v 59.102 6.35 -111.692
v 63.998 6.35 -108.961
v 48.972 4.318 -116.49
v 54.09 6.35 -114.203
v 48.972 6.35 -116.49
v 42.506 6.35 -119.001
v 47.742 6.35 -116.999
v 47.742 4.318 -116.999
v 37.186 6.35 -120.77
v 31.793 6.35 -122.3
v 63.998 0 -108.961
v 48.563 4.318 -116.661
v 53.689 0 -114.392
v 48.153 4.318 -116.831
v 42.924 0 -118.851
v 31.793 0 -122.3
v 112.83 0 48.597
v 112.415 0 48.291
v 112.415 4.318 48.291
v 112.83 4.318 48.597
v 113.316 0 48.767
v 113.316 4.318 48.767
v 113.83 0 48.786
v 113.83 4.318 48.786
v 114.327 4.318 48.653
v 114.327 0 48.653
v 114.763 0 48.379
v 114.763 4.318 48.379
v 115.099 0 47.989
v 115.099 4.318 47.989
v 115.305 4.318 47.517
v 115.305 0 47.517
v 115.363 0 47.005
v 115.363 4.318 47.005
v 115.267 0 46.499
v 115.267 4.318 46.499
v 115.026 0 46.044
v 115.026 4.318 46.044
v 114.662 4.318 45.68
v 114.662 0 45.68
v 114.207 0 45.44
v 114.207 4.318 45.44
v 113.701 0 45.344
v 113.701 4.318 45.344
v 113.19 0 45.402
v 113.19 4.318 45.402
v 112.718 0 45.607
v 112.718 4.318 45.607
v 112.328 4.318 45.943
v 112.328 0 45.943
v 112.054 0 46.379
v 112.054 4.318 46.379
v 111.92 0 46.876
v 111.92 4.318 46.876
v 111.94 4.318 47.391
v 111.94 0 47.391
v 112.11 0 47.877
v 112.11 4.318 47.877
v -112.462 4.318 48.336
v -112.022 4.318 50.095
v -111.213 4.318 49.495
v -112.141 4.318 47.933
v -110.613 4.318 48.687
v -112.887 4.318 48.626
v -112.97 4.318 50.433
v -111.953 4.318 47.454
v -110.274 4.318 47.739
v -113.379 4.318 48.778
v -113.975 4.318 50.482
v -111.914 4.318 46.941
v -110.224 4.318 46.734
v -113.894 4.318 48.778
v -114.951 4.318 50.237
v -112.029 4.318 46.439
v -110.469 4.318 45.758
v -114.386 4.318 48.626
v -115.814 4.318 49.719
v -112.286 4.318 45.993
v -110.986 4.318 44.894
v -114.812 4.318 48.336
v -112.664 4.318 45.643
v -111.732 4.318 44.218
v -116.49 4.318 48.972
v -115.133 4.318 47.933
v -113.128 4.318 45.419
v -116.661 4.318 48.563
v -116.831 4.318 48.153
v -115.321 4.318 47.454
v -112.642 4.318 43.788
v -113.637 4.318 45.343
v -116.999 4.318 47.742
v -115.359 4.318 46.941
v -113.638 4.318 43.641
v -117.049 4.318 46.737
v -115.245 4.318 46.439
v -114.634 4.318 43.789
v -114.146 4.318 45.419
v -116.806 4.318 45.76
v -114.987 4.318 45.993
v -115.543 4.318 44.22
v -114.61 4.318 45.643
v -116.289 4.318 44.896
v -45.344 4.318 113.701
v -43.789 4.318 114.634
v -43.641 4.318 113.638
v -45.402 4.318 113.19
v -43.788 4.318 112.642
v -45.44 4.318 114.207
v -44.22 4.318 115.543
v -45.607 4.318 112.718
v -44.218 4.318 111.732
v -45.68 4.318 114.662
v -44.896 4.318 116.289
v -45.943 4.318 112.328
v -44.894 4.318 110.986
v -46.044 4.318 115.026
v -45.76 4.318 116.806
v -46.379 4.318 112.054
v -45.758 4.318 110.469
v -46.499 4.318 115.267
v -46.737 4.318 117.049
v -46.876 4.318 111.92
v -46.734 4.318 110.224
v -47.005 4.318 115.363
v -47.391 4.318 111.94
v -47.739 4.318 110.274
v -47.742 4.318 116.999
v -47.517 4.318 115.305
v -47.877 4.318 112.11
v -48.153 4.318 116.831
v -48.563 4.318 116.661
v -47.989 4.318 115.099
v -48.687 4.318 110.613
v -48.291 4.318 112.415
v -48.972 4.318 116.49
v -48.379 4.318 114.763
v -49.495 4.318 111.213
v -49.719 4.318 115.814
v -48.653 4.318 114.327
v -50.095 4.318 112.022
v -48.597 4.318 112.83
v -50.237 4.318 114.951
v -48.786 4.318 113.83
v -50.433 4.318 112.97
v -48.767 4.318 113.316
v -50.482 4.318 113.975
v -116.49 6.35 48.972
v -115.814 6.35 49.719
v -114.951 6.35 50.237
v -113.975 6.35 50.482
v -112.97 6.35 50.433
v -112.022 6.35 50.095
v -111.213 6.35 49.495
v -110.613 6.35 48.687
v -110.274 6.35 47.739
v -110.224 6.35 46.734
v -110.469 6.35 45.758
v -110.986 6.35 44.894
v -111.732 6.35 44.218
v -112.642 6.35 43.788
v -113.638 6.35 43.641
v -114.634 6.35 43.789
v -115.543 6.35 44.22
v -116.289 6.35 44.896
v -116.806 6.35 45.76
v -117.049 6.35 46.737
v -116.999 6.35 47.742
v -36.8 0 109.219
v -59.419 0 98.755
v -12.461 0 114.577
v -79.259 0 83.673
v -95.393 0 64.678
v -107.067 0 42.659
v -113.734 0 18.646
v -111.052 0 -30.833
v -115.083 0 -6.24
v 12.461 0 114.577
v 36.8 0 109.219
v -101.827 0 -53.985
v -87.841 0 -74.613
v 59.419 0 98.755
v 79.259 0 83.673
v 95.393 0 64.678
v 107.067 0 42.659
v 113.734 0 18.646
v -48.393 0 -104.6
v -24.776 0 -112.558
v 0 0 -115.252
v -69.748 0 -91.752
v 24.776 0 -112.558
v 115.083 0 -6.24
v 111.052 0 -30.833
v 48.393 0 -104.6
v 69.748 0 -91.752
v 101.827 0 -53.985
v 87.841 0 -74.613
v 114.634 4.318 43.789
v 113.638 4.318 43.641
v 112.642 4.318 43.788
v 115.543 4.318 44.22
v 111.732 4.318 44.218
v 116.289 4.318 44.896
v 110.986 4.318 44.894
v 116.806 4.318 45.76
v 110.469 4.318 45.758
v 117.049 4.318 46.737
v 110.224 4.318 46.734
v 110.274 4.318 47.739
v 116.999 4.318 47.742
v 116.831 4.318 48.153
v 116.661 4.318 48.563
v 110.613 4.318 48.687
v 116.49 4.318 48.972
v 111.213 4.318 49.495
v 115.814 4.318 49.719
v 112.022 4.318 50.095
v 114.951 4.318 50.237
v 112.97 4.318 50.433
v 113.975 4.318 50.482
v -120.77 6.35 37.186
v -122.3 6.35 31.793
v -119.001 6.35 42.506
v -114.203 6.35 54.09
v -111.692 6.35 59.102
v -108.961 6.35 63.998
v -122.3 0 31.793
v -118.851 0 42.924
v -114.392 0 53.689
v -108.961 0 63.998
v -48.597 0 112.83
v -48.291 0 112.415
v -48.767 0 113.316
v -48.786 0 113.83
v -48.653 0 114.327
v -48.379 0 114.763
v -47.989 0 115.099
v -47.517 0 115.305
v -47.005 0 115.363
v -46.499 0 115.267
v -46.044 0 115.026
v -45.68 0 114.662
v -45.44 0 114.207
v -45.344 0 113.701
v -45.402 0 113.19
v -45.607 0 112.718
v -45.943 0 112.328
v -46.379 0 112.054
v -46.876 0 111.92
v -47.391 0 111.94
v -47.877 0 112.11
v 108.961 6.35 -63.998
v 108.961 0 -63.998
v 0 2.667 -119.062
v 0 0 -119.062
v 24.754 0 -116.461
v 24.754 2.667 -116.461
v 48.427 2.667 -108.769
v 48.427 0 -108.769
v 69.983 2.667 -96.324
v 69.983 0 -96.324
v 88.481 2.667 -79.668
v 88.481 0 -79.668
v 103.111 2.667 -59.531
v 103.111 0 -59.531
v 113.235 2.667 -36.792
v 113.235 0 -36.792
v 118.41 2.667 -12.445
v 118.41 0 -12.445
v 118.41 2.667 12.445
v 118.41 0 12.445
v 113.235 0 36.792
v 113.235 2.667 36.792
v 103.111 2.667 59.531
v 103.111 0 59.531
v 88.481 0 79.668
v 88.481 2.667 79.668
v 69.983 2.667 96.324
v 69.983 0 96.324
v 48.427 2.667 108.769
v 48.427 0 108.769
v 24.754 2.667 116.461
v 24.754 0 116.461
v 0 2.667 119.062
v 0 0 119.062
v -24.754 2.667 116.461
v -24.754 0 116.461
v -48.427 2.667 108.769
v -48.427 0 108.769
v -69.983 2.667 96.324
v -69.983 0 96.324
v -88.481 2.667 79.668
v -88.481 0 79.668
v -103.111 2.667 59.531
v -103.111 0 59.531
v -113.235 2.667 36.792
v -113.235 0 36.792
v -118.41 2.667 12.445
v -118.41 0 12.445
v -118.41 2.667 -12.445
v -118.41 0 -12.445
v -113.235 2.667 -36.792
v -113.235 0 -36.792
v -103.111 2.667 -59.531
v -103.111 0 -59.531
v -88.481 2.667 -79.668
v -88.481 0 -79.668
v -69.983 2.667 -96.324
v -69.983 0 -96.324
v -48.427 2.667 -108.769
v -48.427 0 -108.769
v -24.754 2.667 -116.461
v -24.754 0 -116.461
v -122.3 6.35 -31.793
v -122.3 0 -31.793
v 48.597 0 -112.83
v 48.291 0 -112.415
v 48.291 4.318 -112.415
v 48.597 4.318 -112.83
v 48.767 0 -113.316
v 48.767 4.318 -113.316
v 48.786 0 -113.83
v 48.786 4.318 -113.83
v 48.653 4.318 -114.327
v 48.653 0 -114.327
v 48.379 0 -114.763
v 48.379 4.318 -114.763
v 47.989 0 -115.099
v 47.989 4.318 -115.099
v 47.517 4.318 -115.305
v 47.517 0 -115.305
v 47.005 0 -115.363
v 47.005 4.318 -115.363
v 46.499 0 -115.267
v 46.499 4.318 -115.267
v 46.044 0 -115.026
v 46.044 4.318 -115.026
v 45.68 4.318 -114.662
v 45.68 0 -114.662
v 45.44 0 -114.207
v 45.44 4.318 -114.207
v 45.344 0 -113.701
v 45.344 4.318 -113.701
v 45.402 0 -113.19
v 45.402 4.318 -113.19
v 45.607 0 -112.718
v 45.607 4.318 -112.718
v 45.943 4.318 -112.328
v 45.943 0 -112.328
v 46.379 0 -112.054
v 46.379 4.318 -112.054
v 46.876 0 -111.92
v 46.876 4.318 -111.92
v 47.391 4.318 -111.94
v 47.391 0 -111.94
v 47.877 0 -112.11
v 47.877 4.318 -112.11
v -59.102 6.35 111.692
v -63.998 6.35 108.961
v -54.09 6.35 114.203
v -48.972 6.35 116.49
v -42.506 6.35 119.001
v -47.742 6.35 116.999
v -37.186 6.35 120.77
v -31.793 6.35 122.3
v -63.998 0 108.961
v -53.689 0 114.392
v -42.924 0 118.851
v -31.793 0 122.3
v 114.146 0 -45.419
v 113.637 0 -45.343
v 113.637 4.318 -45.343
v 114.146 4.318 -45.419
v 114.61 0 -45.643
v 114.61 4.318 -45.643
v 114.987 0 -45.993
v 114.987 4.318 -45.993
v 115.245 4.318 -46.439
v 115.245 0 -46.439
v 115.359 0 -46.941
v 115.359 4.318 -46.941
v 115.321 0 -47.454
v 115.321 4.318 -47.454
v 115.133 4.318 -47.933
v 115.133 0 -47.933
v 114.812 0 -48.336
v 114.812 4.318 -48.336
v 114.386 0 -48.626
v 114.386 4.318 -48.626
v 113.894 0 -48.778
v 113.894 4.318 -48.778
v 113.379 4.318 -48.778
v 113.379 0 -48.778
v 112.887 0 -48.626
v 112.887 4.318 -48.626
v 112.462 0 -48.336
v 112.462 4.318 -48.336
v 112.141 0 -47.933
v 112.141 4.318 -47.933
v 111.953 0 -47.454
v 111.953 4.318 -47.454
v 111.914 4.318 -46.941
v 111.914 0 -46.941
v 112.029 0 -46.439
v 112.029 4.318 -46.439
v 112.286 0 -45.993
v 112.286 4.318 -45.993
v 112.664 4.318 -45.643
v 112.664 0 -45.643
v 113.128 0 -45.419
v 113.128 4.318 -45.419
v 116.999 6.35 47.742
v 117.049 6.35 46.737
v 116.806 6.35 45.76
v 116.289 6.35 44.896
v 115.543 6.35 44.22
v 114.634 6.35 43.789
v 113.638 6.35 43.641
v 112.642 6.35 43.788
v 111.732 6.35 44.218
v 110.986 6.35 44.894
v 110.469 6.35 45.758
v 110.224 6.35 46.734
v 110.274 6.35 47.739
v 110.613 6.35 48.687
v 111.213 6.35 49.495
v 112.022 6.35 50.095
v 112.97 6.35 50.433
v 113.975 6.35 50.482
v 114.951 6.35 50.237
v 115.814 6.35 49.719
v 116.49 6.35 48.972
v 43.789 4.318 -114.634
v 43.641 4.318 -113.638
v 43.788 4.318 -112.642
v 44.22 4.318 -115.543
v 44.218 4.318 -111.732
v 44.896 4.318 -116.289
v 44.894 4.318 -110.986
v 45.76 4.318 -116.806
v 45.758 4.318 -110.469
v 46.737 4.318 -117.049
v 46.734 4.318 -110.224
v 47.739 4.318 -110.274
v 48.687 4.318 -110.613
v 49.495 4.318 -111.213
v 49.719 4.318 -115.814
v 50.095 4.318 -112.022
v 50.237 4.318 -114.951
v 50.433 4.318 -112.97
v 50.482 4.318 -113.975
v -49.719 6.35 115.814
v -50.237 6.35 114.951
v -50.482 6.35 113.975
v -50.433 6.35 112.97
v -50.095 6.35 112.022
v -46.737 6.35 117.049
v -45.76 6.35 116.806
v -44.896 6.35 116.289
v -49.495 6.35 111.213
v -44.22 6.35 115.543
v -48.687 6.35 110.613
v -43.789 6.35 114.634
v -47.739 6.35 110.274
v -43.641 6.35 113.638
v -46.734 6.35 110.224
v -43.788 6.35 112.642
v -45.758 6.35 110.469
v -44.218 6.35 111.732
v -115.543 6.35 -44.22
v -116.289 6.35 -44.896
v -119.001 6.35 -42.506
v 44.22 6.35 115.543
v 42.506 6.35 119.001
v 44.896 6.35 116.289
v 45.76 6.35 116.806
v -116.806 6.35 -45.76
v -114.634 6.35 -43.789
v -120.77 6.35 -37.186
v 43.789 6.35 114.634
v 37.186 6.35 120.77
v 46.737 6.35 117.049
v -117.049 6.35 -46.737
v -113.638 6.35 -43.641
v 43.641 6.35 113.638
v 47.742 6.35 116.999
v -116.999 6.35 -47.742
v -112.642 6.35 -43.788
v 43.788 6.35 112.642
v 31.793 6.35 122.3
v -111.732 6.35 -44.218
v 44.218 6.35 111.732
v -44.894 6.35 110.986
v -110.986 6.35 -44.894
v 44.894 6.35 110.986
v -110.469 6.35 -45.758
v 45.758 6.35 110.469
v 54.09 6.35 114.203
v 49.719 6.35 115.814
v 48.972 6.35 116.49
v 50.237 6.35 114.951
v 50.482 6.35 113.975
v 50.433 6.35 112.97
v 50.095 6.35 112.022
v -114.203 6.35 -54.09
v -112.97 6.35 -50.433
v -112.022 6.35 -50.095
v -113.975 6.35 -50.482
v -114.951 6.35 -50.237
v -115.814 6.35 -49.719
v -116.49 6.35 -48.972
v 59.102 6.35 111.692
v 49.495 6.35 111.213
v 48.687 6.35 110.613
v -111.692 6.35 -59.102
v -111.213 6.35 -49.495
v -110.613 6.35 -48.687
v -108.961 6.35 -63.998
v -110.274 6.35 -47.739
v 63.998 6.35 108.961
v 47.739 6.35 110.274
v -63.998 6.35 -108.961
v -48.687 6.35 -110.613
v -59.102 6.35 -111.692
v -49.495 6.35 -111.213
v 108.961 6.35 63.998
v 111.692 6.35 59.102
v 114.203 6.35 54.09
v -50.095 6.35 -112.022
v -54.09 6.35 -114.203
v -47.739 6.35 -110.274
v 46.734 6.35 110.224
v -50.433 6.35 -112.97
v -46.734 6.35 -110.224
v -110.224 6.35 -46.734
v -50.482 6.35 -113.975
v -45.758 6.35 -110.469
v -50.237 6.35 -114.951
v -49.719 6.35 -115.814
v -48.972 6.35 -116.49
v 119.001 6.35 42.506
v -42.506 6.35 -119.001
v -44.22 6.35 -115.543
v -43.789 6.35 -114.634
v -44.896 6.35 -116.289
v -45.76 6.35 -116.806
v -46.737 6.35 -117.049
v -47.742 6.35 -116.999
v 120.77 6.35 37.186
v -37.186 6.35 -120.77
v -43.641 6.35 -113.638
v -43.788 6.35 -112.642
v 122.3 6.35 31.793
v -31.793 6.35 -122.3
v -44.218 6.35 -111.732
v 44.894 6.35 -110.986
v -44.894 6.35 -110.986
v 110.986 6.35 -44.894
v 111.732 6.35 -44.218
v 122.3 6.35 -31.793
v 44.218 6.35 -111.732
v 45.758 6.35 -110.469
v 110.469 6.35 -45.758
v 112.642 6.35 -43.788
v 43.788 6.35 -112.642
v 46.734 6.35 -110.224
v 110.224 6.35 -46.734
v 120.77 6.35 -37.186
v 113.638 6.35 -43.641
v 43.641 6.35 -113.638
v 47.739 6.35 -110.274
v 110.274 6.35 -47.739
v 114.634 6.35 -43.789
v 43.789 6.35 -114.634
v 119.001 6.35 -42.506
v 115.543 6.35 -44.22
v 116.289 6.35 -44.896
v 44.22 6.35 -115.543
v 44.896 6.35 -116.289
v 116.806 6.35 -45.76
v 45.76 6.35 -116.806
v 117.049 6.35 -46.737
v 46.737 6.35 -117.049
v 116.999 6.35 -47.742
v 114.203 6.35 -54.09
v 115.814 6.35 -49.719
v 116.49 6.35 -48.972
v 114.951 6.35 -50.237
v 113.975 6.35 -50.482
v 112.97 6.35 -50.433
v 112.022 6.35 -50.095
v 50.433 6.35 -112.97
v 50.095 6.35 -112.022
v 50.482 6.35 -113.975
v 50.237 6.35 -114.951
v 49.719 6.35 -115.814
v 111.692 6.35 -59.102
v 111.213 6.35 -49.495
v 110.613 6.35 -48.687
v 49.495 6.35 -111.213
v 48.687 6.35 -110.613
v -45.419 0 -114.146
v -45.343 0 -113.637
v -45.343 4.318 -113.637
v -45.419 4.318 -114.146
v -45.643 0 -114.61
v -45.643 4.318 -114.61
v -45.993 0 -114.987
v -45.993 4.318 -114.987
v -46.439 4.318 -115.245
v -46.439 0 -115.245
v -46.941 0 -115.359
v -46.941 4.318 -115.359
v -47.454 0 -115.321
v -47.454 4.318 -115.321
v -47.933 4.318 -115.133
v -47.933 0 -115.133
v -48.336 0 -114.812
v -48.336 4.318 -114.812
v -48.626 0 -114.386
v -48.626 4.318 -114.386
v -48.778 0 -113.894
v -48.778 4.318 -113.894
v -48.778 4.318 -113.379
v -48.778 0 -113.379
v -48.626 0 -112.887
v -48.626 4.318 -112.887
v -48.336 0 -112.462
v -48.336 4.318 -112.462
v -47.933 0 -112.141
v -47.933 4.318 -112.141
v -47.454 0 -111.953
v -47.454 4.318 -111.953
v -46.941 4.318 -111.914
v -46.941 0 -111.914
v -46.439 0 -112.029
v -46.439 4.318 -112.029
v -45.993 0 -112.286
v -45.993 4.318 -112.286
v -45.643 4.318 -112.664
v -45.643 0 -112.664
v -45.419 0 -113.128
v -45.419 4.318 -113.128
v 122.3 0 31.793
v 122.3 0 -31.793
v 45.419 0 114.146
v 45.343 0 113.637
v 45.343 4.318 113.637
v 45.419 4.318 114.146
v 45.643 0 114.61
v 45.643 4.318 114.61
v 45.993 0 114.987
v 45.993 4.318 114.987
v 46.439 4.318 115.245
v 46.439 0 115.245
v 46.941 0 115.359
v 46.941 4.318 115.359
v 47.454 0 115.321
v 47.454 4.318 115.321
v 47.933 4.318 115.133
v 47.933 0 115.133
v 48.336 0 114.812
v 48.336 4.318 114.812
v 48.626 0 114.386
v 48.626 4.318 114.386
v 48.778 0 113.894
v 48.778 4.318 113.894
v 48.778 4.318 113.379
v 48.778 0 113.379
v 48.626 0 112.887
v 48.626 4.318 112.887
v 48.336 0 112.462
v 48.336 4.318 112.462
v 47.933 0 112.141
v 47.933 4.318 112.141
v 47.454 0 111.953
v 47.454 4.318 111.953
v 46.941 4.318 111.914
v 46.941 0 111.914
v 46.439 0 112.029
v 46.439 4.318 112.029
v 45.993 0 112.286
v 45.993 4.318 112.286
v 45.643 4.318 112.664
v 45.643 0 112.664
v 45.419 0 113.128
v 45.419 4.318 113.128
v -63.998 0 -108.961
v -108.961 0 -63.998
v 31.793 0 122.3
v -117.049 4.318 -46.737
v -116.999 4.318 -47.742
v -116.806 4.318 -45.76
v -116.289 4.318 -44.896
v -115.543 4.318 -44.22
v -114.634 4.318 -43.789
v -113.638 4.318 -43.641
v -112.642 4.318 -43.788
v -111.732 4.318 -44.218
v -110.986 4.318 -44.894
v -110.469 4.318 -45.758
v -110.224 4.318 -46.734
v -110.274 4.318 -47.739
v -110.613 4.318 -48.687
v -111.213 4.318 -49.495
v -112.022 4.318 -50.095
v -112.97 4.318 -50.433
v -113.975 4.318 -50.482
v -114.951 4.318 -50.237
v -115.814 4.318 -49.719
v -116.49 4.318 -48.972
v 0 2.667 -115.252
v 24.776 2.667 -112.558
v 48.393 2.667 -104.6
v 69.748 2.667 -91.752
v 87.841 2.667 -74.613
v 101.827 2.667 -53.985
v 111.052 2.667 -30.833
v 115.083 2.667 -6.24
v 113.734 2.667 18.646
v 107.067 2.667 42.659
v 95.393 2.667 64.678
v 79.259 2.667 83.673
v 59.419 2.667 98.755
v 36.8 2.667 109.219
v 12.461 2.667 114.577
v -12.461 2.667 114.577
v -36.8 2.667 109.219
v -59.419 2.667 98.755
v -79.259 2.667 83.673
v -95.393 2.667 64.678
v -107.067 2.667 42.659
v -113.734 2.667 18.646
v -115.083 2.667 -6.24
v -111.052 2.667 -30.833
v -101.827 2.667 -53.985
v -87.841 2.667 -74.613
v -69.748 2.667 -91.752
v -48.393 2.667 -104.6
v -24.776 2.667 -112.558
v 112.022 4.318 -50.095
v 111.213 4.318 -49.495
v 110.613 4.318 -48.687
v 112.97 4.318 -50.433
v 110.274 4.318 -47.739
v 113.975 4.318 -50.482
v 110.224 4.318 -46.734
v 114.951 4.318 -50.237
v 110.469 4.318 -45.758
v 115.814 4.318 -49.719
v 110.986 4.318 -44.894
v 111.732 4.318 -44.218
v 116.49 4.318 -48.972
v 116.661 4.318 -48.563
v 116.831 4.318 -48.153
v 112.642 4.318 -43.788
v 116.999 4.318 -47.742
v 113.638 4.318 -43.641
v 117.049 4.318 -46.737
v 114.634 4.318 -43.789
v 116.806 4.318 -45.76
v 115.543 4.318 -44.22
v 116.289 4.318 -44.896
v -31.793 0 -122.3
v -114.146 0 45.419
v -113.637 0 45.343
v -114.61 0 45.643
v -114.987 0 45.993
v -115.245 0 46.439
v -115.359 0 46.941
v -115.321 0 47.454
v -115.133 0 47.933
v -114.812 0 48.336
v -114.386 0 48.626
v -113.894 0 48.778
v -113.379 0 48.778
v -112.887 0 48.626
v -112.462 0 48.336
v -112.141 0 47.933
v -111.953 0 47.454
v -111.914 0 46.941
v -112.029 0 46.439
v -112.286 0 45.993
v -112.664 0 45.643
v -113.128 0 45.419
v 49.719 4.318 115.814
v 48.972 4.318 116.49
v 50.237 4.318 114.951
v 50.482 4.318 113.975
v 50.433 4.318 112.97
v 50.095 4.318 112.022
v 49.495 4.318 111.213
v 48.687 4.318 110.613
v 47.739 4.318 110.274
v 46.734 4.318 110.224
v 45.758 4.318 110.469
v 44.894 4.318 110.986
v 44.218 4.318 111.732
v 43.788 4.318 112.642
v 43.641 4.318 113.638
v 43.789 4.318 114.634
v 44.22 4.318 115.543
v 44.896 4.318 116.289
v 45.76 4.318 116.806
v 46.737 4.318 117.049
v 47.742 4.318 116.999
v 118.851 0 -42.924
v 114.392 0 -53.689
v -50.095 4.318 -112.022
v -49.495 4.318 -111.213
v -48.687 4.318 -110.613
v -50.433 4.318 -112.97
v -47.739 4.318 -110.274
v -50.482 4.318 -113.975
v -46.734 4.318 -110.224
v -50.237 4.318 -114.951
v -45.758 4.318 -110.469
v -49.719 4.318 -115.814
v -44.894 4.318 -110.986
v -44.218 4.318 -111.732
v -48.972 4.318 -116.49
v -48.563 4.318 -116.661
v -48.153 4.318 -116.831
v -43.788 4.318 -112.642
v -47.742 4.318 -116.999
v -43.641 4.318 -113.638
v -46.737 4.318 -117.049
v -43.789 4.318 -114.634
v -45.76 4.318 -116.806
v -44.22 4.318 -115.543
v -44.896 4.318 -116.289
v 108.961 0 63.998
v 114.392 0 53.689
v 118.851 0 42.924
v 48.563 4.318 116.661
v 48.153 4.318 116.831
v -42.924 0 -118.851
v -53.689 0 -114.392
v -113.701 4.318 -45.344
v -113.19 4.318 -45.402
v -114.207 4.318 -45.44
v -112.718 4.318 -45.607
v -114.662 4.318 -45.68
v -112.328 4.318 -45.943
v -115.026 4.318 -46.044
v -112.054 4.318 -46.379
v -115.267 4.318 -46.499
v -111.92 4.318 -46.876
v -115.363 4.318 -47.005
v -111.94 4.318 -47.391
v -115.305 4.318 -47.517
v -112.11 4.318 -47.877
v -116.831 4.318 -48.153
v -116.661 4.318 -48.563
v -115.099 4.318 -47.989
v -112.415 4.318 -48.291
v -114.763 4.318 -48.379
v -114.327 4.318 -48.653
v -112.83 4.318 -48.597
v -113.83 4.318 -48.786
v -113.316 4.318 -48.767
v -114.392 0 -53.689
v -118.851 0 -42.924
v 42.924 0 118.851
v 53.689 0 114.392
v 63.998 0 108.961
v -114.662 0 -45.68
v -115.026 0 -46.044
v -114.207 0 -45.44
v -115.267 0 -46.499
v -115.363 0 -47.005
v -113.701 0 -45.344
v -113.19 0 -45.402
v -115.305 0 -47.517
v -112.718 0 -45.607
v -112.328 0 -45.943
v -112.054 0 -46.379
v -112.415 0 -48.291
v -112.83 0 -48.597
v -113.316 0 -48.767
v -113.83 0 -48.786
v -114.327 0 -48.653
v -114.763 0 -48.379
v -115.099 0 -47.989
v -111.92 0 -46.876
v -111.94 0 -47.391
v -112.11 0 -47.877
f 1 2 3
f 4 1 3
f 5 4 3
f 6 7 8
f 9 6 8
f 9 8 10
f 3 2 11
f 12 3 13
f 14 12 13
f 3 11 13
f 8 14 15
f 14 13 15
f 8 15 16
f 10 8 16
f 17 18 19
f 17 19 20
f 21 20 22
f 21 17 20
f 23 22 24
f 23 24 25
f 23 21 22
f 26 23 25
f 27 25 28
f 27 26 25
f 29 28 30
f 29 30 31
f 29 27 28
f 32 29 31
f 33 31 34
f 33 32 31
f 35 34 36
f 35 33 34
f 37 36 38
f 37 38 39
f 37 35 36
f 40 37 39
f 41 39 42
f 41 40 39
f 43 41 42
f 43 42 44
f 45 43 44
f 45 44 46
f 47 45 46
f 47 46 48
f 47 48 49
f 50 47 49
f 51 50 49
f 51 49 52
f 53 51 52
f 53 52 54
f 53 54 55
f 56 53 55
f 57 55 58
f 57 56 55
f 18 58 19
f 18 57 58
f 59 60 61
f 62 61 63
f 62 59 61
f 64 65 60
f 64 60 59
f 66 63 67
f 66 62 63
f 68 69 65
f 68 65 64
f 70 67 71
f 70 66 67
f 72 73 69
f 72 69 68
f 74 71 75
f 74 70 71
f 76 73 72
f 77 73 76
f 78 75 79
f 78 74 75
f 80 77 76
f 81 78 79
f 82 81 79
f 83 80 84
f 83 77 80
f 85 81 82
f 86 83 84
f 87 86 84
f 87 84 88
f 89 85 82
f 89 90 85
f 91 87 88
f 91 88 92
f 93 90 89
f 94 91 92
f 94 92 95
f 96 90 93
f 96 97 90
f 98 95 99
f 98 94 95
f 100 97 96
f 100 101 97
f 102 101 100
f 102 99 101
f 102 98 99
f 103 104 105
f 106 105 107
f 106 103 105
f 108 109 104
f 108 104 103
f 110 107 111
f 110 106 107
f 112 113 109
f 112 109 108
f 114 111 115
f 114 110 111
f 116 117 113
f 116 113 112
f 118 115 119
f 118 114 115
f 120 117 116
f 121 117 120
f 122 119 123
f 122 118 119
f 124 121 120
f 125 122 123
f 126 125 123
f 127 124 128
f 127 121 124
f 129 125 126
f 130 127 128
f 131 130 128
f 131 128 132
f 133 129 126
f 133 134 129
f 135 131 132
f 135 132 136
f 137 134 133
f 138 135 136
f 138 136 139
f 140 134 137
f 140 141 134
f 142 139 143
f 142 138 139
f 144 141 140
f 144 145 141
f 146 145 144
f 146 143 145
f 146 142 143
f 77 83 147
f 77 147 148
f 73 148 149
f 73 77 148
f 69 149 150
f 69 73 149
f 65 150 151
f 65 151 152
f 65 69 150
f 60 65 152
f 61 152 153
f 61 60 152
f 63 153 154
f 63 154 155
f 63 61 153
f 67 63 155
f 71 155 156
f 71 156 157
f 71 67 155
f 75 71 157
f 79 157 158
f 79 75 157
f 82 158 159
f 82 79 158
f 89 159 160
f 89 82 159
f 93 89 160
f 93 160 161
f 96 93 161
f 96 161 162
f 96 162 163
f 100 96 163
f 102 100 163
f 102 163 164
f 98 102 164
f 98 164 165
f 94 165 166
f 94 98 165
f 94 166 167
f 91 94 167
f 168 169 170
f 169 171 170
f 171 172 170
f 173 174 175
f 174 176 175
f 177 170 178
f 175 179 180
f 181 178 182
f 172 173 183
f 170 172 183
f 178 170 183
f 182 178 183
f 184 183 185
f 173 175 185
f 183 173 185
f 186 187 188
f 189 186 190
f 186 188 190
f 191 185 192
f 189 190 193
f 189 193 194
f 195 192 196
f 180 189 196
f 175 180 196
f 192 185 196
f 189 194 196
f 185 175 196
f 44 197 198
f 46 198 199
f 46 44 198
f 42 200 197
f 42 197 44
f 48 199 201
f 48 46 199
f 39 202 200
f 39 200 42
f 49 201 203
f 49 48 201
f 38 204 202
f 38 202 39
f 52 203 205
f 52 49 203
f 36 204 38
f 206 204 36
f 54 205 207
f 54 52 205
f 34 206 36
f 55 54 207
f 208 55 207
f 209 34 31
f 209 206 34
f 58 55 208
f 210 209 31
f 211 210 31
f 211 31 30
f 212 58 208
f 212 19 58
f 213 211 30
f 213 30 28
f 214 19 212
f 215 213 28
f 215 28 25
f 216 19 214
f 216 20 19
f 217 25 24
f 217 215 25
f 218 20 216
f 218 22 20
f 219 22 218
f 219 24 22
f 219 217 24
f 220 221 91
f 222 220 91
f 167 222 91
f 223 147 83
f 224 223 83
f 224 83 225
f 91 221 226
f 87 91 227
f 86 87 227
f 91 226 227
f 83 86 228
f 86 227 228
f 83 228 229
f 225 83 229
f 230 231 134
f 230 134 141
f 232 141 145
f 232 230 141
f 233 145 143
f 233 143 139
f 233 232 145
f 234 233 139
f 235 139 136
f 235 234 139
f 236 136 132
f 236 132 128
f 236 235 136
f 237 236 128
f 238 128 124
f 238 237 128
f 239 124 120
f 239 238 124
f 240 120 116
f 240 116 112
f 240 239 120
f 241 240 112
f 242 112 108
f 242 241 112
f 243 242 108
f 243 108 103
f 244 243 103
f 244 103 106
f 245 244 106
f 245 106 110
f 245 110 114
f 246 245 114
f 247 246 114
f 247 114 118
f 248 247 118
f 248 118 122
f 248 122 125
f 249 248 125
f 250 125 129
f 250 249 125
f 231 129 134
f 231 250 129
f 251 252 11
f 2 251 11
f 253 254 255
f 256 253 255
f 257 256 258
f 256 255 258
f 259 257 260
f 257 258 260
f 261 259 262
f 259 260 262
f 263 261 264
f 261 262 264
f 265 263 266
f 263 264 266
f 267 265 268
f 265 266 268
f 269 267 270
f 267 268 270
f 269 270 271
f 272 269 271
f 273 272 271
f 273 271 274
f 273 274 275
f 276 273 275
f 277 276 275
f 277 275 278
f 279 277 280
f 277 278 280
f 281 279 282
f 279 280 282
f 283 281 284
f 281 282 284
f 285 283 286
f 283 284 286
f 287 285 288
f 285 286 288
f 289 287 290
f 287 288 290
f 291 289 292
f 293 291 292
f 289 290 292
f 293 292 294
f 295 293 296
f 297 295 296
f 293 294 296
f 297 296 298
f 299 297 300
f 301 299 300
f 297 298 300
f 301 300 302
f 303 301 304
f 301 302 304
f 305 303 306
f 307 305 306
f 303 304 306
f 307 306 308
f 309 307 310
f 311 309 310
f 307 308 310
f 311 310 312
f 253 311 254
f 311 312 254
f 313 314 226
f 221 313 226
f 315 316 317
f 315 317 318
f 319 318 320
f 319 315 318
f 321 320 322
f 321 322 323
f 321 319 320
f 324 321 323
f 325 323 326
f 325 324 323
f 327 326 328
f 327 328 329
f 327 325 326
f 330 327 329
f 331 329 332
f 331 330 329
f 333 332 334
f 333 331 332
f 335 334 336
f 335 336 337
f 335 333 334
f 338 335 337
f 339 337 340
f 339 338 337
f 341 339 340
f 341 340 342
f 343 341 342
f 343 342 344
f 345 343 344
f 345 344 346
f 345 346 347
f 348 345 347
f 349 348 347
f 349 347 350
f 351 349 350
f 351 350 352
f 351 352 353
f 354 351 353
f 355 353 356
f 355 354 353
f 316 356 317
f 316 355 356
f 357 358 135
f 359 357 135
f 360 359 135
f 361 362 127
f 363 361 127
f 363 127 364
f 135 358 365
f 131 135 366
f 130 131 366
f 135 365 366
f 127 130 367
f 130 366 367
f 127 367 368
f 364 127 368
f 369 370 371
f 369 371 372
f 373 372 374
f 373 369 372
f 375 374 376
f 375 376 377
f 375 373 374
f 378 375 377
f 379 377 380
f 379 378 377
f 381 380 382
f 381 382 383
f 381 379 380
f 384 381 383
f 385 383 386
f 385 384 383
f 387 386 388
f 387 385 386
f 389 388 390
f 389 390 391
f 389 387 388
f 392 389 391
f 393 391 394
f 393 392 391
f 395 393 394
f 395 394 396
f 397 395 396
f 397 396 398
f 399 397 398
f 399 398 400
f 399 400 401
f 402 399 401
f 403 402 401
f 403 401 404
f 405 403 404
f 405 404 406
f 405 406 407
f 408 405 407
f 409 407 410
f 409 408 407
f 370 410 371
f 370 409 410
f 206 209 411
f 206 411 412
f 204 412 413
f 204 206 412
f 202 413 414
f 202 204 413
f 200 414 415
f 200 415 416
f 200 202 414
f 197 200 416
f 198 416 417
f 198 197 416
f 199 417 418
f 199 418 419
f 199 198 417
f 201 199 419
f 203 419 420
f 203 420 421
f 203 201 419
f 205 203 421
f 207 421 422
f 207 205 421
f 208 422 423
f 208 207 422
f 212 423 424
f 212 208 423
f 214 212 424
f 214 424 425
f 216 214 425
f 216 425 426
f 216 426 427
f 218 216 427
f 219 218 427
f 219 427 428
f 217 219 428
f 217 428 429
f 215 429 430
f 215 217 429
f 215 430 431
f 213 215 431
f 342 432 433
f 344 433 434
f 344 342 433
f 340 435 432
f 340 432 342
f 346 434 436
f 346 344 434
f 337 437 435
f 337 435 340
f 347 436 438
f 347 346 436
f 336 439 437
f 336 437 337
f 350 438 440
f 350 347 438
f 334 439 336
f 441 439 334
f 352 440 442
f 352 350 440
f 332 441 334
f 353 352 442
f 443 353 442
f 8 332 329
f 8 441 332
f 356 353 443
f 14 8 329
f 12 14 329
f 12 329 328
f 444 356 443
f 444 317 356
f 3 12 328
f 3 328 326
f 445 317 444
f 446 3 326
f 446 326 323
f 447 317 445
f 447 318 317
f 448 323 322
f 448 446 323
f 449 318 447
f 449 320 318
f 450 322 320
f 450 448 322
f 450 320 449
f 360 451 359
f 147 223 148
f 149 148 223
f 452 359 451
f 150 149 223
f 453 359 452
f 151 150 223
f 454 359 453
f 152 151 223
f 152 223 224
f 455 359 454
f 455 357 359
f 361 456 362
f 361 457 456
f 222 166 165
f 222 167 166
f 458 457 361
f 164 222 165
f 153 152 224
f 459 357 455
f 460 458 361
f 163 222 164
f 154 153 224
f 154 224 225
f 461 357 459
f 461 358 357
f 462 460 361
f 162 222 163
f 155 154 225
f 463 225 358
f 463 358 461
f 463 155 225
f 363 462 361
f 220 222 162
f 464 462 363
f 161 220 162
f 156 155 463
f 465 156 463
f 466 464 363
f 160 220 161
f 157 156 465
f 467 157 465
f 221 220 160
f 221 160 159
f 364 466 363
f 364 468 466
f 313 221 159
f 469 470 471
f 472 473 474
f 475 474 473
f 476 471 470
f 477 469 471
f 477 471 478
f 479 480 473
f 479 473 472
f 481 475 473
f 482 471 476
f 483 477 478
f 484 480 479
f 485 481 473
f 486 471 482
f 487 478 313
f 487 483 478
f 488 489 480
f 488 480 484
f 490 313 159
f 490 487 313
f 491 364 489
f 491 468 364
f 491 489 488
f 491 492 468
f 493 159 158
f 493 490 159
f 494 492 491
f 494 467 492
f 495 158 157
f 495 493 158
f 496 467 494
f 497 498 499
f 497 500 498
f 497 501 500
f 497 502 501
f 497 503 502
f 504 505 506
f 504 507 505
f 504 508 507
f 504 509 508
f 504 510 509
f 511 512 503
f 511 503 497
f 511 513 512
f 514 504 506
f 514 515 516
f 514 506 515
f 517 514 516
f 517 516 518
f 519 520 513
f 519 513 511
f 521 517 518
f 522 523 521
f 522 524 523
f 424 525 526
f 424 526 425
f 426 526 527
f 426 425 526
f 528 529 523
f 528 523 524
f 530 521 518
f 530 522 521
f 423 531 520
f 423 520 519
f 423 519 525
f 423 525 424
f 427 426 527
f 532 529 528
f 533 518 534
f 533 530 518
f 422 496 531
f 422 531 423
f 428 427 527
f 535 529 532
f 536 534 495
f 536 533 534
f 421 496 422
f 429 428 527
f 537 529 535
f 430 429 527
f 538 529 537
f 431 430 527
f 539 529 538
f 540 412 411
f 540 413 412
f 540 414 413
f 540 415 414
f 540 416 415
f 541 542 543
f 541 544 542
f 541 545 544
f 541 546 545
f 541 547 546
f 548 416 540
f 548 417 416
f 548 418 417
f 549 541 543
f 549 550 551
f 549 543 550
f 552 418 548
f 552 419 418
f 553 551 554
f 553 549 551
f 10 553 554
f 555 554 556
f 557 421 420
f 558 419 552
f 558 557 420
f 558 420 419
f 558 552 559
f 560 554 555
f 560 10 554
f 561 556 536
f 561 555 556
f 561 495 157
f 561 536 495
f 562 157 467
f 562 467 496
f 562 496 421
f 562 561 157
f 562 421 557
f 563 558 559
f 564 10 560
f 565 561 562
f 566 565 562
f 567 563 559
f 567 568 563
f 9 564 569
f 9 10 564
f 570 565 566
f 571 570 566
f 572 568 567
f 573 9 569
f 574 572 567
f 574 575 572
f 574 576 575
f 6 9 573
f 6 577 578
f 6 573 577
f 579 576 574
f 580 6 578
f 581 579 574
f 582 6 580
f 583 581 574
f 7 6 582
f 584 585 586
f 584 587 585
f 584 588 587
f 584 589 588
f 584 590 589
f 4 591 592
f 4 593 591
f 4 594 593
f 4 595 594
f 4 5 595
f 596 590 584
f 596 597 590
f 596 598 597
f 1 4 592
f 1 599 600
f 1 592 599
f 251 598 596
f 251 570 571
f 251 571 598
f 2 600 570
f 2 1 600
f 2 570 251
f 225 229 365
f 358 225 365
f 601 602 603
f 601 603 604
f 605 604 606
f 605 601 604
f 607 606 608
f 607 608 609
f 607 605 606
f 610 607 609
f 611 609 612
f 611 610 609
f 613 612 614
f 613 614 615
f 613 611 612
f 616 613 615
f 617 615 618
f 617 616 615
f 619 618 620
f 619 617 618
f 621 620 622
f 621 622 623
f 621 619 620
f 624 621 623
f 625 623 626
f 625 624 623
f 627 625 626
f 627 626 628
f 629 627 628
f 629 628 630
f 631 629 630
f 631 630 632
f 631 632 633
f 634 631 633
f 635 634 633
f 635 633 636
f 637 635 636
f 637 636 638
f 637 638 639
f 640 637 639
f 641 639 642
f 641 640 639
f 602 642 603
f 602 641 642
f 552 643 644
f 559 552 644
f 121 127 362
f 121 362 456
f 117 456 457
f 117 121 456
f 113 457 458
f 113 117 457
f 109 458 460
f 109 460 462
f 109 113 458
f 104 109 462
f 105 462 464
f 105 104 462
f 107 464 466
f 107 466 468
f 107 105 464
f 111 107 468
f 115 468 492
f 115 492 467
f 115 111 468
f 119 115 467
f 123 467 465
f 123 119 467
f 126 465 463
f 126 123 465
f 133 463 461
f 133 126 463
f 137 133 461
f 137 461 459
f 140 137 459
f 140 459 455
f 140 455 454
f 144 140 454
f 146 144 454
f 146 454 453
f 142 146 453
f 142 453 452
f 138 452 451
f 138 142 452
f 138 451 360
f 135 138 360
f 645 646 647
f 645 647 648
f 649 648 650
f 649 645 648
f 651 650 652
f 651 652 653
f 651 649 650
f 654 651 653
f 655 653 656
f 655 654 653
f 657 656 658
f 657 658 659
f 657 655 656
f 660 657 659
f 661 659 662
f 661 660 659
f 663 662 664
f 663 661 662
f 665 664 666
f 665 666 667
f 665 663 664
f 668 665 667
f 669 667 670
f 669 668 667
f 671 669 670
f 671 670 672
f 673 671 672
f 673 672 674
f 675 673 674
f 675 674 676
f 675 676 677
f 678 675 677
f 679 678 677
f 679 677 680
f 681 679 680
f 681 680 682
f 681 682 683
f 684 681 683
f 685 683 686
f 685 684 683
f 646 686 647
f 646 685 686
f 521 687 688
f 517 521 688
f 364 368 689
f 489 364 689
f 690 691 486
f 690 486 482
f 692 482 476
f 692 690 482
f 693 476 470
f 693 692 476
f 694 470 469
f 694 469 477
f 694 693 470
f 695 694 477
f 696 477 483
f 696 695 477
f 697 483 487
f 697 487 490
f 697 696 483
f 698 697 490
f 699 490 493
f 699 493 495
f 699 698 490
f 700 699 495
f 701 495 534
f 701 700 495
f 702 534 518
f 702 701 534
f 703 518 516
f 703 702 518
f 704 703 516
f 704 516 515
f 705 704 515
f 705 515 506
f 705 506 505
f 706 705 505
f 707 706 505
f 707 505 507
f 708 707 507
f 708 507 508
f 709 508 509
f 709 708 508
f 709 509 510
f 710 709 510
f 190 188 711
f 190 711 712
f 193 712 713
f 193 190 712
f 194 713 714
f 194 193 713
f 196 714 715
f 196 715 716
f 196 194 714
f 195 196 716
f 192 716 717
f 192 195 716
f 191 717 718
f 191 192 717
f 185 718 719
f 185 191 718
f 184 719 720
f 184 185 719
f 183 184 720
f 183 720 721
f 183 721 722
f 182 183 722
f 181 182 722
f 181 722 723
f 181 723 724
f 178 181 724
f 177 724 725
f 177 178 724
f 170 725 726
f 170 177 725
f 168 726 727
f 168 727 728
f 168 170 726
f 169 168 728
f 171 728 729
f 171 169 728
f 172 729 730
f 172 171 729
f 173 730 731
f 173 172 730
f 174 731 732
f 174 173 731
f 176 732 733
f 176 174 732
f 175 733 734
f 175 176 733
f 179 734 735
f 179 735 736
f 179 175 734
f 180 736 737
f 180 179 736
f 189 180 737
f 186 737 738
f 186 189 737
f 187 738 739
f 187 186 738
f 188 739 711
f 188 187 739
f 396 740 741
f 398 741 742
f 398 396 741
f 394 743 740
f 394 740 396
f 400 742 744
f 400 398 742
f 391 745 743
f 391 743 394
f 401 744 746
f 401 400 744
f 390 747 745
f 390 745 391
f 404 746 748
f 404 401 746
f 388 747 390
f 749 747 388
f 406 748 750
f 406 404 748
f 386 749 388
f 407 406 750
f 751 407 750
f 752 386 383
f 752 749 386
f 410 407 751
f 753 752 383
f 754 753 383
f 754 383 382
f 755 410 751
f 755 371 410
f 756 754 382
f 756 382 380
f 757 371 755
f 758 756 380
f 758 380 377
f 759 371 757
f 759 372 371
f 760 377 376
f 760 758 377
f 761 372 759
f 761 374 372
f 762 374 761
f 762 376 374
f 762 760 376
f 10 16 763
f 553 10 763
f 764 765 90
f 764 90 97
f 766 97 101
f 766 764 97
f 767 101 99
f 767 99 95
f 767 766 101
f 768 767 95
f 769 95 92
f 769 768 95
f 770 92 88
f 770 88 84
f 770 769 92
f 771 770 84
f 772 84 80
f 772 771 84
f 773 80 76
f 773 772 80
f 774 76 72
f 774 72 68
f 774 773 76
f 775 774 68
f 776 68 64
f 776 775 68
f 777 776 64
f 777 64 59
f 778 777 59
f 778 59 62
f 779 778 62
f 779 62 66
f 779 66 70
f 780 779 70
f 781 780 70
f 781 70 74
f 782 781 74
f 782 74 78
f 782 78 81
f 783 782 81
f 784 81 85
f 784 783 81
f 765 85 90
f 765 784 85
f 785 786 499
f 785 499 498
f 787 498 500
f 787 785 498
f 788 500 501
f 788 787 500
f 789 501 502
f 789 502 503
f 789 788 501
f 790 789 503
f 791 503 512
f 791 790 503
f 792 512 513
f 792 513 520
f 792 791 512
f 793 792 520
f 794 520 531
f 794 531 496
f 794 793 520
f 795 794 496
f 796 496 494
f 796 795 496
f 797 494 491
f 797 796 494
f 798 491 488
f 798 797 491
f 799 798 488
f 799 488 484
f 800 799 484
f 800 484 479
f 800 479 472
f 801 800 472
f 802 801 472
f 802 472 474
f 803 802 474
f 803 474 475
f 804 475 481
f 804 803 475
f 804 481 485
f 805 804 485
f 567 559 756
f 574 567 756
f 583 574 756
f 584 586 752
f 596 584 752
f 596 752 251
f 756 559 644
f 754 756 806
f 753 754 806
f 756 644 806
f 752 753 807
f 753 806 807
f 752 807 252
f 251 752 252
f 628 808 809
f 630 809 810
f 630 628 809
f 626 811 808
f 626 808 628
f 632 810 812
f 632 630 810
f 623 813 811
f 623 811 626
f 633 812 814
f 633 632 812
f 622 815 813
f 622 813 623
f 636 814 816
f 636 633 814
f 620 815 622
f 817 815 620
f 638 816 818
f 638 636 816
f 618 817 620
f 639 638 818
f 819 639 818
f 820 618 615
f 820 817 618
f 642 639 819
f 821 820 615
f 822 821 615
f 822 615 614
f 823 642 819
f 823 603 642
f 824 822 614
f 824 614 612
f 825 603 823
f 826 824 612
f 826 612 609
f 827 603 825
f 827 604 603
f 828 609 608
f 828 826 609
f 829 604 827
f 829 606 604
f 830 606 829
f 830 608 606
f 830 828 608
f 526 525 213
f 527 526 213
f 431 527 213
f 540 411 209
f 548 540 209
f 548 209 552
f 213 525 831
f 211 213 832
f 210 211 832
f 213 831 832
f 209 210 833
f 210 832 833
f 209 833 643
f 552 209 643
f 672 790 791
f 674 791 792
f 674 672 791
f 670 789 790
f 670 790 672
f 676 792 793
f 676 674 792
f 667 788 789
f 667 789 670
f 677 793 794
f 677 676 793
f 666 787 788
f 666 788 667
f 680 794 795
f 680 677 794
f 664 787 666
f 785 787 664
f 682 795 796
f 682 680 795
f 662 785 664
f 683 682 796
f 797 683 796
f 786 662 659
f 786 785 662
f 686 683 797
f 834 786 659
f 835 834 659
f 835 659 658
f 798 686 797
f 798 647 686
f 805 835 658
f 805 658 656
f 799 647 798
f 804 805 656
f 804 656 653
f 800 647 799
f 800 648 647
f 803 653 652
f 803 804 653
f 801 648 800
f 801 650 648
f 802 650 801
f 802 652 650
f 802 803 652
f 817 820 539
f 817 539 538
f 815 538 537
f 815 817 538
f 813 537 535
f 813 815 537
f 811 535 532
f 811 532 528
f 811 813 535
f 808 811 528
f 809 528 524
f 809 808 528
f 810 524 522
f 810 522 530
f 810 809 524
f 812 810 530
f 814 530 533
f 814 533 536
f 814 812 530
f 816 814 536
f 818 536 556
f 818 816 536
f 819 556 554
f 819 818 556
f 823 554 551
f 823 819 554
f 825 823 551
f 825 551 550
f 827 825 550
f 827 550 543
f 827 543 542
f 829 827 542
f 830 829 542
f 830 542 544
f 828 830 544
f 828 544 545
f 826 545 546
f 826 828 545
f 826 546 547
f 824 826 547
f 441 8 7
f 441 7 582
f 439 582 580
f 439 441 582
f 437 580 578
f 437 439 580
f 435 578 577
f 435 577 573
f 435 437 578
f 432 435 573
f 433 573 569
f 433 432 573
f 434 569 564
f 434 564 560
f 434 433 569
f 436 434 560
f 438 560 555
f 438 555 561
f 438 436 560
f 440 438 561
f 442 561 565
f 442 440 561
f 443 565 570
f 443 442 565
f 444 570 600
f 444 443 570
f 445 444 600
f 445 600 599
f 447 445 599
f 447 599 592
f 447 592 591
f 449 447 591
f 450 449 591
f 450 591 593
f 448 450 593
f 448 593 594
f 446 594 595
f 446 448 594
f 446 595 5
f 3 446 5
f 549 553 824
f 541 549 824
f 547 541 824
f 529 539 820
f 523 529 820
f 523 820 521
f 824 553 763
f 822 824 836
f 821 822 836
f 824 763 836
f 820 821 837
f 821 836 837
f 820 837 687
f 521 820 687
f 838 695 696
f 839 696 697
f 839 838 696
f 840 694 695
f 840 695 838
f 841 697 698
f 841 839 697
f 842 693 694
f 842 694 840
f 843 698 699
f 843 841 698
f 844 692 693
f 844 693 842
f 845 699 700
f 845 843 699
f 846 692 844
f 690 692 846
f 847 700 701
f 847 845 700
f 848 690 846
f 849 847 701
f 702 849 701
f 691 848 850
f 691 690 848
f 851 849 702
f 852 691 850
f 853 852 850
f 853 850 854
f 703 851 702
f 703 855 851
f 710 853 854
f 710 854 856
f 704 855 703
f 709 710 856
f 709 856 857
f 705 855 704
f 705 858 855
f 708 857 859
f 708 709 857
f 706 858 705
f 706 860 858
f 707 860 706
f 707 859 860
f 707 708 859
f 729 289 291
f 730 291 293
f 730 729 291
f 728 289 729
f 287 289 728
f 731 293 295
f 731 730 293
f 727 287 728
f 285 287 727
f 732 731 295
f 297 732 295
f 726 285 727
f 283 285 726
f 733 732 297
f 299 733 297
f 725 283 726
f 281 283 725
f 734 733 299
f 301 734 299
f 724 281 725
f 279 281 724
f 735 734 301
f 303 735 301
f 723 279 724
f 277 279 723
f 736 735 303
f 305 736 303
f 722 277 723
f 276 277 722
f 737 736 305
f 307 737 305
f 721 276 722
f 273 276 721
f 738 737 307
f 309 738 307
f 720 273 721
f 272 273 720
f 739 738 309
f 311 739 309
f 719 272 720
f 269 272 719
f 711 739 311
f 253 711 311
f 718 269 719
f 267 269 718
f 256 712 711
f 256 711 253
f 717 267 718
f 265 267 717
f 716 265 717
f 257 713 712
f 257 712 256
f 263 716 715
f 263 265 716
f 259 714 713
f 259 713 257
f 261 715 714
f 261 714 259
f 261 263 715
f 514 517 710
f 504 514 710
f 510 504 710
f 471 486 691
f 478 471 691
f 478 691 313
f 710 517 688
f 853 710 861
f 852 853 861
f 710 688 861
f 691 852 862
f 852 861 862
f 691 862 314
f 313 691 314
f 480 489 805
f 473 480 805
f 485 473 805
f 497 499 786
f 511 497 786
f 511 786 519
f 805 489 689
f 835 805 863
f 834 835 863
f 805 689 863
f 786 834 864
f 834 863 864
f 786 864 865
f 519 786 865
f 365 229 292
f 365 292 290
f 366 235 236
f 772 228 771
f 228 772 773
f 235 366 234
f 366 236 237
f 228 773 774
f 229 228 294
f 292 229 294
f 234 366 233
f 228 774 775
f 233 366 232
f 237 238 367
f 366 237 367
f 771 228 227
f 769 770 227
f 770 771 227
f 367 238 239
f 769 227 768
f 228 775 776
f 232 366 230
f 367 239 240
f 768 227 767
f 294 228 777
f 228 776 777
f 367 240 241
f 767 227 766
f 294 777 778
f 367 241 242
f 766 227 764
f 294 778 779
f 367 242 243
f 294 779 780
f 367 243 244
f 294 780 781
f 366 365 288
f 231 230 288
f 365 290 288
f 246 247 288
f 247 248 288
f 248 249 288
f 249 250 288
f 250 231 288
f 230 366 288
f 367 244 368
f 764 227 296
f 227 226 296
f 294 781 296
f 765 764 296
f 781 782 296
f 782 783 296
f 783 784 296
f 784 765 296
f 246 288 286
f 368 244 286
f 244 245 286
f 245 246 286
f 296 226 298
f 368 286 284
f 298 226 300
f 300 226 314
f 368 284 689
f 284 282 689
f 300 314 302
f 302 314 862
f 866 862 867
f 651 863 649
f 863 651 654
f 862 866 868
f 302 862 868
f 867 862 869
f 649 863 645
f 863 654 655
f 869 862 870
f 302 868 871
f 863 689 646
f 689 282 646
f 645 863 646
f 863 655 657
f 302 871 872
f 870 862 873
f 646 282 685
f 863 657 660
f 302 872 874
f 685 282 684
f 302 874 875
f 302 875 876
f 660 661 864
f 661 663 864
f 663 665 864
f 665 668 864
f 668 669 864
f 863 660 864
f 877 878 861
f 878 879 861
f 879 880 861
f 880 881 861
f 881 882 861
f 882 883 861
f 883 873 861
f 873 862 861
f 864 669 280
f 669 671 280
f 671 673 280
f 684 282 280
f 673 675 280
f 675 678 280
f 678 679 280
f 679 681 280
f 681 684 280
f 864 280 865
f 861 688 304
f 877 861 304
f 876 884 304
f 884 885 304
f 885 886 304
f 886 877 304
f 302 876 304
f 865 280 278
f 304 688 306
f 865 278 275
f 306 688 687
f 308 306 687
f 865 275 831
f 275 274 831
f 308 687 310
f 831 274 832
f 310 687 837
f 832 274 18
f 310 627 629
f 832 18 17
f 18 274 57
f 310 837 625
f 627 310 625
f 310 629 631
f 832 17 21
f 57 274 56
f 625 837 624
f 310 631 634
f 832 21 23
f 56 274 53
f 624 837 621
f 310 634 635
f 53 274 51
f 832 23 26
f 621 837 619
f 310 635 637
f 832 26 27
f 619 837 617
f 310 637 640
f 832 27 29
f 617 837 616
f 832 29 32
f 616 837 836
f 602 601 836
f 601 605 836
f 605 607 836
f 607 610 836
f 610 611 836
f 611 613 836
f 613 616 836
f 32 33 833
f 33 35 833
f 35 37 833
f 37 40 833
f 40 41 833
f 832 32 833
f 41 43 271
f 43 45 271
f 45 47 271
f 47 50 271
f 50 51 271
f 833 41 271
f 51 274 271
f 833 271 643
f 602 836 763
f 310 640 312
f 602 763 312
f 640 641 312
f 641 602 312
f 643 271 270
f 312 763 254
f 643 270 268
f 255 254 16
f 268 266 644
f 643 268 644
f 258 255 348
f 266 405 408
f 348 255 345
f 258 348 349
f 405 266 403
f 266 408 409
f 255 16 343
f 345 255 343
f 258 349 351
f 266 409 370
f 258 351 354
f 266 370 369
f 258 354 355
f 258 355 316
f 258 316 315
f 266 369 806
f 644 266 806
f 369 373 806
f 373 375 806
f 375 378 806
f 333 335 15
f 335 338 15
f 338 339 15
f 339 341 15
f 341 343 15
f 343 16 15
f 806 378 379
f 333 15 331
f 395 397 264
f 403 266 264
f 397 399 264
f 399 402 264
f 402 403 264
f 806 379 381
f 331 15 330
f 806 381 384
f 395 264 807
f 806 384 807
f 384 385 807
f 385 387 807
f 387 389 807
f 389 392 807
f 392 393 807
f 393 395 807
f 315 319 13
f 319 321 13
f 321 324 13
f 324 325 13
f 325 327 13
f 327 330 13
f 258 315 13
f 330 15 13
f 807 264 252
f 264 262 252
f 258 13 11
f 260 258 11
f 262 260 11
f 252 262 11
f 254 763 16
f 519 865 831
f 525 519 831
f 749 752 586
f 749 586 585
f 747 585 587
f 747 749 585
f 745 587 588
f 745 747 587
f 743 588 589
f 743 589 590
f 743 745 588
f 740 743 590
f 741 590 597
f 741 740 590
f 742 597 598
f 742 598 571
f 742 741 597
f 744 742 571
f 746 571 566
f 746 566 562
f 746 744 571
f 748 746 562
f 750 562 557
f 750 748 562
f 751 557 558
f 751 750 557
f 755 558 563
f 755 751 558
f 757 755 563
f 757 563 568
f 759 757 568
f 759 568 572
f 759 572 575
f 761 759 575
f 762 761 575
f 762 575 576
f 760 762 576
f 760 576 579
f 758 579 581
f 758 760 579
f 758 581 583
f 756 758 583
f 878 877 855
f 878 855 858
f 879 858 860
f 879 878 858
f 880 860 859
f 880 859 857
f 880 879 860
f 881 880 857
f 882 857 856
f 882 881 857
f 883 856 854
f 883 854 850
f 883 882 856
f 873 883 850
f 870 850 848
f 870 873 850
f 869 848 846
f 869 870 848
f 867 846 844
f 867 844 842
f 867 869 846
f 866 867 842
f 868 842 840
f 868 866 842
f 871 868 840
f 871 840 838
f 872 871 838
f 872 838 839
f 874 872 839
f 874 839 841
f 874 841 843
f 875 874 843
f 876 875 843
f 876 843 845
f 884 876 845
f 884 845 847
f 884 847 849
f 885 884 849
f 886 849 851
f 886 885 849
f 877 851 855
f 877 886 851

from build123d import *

# Parameters (mm, degrees)
BOSS_EXTRUDE1_DEPTH       = 6.35
SKETCH2_R                 = 119.0625
SKETCH2_R_2               = 115.2525
CUT_EXTRUDE1_DEPTH        = 2.667
ADVANCEDHOLE1_START       = 4.318
ADVANCEDHOLE1_DEPTH       = 2.032
ADVANCEDHOLE1_2_OUTLINE_R = 1.7272
ADVANCEDHOLE1_2_DEPTH     = 4.318
CIRPATTERN1_COUNT         = 8


# Read off the part's stored shape, not the designer's step: AdvancedHole1
with BuildPart() as part:
    # Sketch1 → Boss-Extrude1 (new body)
    with BuildSketch(Plane(origin=(0, 0, 0), x_dir=(1, 0, 0), z_dir=(0, 1, 0))):
        with BuildLine():
            ThreePointArc((-31.793446259, 122.3), (-48.357791931, 116.746037126), (-63.997797892, 108.960520786))
            Line((-63.997797892, 108.960520786), (-108.960520786, 63.997797892))
            ThreePointArc((-108.960520786, 63.997797892), (-116.746037126, 48.357791931), (-122.3, 31.793446259))
            Line((-122.3, 31.793446259), (-122.3, -31.793446259))
            ThreePointArc((-122.3, -31.793446259), (-116.746037126, -48.357791931), (-108.960520786, -63.997797892))
            Line((-108.960520786, -63.997797892), (-63.997797892, -108.960520786))
            ThreePointArc((-63.997797892, -108.960520786), (-48.357791931, -116.746037126), (-31.793446259, -122.3))
            Line((-31.793446259, -122.3), (31.793446259, -122.3))
            ThreePointArc((31.793446259, -122.3), (48.357791931, -116.746037126), (63.997797892, -108.960520786))
            Line((63.997797892, -108.960520786), (108.960520786, -63.997797892))
            ThreePointArc((108.960520786, -63.997797892), (116.746037126, -48.357791931), (122.3, -31.793446259))
            Line((122.3, -31.793446259), (122.3, 31.793446259))
            ThreePointArc((122.3, 31.793446259), (116.746037126, 48.357791931), (108.960520786, 63.997797892))
            Line((108.960520786, 63.997797892), (63.997797892, 108.960520786))
            ThreePointArc((63.997797892, 108.960520786), (48.357791931, 116.746037126), (31.793446259, 122.3))
            Line((31.793446259, 122.3), (-31.793446259, 122.3))
        make_face()
    extrude(amount=BOSS_EXTRUDE1_DEPTH)

    # Sketch2 → Cut-Extrude1 (cut)
    with BuildSketch(Plane.XZ):
        with Locations(Location((0, 0, 0), (0, 0, 270))):
            Circle(SKETCH2_R)
        with Locations(Location((0, 0, 0), (0, 0, 270))):
            Circle(SKETCH2_R_2, mode=Mode.SUBTRACT)
    extrude(amount=-CUT_EXTRUDE1_DEPTH, mode=Mode.SUBTRACT)

    # AdvancedHole1 outline → AdvancedHole1 (cut)
    with BuildSketch(Plane(origin=(0, 0, 0), x_dir=(1, 0, 0), z_dir=(0, 1, 0)).offset(ADVANCEDHOLE1_START)):
        with BuildLine():
            ThreePointArc((-47.742027192, 116.999196855), (-48.357791931, 116.746037126), (-48.972214314, 116.489636665))
            ThreePointArc((-48.972214314, 116.489636665), (-45.757649346, 110.468737644), (-47.742027192, 116.999196855))
        make_face()
    advancedhole1 = extrude(amount=ADVANCEDHOLE1_DEPTH, mode=Mode.SUBTRACT)

    # AdvancedHole1 2 outline → AdvancedHole1 2 (cut)
    with BuildSketch(Plane(origin=(0, 0, 0), x_dir=(1, 0, 0), z_dir=(0, 1, 0))):
        with Locations((-47.069870839, 113.636720559)):
            Circle(ADVANCEDHOLE1_2_OUTLINE_R)
    advancedhole1_2 = extrude(amount=ADVANCEDHOLE1_2_DEPTH, mode=Mode.SUBTRACT)

    # CirPattern1: AdvancedHole1, AdvancedHole1 2 ×8 about axis
    cirpattern1_axis = Axis((0, 0, 0), (0, 1, 0))
    add([advancedhole1.rotate(cirpattern1_axis, i * 360 / CIRPATTERN1_COUNT) for i in range(1, CIRPATTERN1_COUNT)], mode=Mode.SUBTRACT)
    add([advancedhole1_2.rotate(cirpattern1_axis, i * 360 / CIRPATTERN1_COUNT) for i in range(1, CIRPATTERN1_COUNT)], mode=Mode.SUBTRACT)


solid = part.part
